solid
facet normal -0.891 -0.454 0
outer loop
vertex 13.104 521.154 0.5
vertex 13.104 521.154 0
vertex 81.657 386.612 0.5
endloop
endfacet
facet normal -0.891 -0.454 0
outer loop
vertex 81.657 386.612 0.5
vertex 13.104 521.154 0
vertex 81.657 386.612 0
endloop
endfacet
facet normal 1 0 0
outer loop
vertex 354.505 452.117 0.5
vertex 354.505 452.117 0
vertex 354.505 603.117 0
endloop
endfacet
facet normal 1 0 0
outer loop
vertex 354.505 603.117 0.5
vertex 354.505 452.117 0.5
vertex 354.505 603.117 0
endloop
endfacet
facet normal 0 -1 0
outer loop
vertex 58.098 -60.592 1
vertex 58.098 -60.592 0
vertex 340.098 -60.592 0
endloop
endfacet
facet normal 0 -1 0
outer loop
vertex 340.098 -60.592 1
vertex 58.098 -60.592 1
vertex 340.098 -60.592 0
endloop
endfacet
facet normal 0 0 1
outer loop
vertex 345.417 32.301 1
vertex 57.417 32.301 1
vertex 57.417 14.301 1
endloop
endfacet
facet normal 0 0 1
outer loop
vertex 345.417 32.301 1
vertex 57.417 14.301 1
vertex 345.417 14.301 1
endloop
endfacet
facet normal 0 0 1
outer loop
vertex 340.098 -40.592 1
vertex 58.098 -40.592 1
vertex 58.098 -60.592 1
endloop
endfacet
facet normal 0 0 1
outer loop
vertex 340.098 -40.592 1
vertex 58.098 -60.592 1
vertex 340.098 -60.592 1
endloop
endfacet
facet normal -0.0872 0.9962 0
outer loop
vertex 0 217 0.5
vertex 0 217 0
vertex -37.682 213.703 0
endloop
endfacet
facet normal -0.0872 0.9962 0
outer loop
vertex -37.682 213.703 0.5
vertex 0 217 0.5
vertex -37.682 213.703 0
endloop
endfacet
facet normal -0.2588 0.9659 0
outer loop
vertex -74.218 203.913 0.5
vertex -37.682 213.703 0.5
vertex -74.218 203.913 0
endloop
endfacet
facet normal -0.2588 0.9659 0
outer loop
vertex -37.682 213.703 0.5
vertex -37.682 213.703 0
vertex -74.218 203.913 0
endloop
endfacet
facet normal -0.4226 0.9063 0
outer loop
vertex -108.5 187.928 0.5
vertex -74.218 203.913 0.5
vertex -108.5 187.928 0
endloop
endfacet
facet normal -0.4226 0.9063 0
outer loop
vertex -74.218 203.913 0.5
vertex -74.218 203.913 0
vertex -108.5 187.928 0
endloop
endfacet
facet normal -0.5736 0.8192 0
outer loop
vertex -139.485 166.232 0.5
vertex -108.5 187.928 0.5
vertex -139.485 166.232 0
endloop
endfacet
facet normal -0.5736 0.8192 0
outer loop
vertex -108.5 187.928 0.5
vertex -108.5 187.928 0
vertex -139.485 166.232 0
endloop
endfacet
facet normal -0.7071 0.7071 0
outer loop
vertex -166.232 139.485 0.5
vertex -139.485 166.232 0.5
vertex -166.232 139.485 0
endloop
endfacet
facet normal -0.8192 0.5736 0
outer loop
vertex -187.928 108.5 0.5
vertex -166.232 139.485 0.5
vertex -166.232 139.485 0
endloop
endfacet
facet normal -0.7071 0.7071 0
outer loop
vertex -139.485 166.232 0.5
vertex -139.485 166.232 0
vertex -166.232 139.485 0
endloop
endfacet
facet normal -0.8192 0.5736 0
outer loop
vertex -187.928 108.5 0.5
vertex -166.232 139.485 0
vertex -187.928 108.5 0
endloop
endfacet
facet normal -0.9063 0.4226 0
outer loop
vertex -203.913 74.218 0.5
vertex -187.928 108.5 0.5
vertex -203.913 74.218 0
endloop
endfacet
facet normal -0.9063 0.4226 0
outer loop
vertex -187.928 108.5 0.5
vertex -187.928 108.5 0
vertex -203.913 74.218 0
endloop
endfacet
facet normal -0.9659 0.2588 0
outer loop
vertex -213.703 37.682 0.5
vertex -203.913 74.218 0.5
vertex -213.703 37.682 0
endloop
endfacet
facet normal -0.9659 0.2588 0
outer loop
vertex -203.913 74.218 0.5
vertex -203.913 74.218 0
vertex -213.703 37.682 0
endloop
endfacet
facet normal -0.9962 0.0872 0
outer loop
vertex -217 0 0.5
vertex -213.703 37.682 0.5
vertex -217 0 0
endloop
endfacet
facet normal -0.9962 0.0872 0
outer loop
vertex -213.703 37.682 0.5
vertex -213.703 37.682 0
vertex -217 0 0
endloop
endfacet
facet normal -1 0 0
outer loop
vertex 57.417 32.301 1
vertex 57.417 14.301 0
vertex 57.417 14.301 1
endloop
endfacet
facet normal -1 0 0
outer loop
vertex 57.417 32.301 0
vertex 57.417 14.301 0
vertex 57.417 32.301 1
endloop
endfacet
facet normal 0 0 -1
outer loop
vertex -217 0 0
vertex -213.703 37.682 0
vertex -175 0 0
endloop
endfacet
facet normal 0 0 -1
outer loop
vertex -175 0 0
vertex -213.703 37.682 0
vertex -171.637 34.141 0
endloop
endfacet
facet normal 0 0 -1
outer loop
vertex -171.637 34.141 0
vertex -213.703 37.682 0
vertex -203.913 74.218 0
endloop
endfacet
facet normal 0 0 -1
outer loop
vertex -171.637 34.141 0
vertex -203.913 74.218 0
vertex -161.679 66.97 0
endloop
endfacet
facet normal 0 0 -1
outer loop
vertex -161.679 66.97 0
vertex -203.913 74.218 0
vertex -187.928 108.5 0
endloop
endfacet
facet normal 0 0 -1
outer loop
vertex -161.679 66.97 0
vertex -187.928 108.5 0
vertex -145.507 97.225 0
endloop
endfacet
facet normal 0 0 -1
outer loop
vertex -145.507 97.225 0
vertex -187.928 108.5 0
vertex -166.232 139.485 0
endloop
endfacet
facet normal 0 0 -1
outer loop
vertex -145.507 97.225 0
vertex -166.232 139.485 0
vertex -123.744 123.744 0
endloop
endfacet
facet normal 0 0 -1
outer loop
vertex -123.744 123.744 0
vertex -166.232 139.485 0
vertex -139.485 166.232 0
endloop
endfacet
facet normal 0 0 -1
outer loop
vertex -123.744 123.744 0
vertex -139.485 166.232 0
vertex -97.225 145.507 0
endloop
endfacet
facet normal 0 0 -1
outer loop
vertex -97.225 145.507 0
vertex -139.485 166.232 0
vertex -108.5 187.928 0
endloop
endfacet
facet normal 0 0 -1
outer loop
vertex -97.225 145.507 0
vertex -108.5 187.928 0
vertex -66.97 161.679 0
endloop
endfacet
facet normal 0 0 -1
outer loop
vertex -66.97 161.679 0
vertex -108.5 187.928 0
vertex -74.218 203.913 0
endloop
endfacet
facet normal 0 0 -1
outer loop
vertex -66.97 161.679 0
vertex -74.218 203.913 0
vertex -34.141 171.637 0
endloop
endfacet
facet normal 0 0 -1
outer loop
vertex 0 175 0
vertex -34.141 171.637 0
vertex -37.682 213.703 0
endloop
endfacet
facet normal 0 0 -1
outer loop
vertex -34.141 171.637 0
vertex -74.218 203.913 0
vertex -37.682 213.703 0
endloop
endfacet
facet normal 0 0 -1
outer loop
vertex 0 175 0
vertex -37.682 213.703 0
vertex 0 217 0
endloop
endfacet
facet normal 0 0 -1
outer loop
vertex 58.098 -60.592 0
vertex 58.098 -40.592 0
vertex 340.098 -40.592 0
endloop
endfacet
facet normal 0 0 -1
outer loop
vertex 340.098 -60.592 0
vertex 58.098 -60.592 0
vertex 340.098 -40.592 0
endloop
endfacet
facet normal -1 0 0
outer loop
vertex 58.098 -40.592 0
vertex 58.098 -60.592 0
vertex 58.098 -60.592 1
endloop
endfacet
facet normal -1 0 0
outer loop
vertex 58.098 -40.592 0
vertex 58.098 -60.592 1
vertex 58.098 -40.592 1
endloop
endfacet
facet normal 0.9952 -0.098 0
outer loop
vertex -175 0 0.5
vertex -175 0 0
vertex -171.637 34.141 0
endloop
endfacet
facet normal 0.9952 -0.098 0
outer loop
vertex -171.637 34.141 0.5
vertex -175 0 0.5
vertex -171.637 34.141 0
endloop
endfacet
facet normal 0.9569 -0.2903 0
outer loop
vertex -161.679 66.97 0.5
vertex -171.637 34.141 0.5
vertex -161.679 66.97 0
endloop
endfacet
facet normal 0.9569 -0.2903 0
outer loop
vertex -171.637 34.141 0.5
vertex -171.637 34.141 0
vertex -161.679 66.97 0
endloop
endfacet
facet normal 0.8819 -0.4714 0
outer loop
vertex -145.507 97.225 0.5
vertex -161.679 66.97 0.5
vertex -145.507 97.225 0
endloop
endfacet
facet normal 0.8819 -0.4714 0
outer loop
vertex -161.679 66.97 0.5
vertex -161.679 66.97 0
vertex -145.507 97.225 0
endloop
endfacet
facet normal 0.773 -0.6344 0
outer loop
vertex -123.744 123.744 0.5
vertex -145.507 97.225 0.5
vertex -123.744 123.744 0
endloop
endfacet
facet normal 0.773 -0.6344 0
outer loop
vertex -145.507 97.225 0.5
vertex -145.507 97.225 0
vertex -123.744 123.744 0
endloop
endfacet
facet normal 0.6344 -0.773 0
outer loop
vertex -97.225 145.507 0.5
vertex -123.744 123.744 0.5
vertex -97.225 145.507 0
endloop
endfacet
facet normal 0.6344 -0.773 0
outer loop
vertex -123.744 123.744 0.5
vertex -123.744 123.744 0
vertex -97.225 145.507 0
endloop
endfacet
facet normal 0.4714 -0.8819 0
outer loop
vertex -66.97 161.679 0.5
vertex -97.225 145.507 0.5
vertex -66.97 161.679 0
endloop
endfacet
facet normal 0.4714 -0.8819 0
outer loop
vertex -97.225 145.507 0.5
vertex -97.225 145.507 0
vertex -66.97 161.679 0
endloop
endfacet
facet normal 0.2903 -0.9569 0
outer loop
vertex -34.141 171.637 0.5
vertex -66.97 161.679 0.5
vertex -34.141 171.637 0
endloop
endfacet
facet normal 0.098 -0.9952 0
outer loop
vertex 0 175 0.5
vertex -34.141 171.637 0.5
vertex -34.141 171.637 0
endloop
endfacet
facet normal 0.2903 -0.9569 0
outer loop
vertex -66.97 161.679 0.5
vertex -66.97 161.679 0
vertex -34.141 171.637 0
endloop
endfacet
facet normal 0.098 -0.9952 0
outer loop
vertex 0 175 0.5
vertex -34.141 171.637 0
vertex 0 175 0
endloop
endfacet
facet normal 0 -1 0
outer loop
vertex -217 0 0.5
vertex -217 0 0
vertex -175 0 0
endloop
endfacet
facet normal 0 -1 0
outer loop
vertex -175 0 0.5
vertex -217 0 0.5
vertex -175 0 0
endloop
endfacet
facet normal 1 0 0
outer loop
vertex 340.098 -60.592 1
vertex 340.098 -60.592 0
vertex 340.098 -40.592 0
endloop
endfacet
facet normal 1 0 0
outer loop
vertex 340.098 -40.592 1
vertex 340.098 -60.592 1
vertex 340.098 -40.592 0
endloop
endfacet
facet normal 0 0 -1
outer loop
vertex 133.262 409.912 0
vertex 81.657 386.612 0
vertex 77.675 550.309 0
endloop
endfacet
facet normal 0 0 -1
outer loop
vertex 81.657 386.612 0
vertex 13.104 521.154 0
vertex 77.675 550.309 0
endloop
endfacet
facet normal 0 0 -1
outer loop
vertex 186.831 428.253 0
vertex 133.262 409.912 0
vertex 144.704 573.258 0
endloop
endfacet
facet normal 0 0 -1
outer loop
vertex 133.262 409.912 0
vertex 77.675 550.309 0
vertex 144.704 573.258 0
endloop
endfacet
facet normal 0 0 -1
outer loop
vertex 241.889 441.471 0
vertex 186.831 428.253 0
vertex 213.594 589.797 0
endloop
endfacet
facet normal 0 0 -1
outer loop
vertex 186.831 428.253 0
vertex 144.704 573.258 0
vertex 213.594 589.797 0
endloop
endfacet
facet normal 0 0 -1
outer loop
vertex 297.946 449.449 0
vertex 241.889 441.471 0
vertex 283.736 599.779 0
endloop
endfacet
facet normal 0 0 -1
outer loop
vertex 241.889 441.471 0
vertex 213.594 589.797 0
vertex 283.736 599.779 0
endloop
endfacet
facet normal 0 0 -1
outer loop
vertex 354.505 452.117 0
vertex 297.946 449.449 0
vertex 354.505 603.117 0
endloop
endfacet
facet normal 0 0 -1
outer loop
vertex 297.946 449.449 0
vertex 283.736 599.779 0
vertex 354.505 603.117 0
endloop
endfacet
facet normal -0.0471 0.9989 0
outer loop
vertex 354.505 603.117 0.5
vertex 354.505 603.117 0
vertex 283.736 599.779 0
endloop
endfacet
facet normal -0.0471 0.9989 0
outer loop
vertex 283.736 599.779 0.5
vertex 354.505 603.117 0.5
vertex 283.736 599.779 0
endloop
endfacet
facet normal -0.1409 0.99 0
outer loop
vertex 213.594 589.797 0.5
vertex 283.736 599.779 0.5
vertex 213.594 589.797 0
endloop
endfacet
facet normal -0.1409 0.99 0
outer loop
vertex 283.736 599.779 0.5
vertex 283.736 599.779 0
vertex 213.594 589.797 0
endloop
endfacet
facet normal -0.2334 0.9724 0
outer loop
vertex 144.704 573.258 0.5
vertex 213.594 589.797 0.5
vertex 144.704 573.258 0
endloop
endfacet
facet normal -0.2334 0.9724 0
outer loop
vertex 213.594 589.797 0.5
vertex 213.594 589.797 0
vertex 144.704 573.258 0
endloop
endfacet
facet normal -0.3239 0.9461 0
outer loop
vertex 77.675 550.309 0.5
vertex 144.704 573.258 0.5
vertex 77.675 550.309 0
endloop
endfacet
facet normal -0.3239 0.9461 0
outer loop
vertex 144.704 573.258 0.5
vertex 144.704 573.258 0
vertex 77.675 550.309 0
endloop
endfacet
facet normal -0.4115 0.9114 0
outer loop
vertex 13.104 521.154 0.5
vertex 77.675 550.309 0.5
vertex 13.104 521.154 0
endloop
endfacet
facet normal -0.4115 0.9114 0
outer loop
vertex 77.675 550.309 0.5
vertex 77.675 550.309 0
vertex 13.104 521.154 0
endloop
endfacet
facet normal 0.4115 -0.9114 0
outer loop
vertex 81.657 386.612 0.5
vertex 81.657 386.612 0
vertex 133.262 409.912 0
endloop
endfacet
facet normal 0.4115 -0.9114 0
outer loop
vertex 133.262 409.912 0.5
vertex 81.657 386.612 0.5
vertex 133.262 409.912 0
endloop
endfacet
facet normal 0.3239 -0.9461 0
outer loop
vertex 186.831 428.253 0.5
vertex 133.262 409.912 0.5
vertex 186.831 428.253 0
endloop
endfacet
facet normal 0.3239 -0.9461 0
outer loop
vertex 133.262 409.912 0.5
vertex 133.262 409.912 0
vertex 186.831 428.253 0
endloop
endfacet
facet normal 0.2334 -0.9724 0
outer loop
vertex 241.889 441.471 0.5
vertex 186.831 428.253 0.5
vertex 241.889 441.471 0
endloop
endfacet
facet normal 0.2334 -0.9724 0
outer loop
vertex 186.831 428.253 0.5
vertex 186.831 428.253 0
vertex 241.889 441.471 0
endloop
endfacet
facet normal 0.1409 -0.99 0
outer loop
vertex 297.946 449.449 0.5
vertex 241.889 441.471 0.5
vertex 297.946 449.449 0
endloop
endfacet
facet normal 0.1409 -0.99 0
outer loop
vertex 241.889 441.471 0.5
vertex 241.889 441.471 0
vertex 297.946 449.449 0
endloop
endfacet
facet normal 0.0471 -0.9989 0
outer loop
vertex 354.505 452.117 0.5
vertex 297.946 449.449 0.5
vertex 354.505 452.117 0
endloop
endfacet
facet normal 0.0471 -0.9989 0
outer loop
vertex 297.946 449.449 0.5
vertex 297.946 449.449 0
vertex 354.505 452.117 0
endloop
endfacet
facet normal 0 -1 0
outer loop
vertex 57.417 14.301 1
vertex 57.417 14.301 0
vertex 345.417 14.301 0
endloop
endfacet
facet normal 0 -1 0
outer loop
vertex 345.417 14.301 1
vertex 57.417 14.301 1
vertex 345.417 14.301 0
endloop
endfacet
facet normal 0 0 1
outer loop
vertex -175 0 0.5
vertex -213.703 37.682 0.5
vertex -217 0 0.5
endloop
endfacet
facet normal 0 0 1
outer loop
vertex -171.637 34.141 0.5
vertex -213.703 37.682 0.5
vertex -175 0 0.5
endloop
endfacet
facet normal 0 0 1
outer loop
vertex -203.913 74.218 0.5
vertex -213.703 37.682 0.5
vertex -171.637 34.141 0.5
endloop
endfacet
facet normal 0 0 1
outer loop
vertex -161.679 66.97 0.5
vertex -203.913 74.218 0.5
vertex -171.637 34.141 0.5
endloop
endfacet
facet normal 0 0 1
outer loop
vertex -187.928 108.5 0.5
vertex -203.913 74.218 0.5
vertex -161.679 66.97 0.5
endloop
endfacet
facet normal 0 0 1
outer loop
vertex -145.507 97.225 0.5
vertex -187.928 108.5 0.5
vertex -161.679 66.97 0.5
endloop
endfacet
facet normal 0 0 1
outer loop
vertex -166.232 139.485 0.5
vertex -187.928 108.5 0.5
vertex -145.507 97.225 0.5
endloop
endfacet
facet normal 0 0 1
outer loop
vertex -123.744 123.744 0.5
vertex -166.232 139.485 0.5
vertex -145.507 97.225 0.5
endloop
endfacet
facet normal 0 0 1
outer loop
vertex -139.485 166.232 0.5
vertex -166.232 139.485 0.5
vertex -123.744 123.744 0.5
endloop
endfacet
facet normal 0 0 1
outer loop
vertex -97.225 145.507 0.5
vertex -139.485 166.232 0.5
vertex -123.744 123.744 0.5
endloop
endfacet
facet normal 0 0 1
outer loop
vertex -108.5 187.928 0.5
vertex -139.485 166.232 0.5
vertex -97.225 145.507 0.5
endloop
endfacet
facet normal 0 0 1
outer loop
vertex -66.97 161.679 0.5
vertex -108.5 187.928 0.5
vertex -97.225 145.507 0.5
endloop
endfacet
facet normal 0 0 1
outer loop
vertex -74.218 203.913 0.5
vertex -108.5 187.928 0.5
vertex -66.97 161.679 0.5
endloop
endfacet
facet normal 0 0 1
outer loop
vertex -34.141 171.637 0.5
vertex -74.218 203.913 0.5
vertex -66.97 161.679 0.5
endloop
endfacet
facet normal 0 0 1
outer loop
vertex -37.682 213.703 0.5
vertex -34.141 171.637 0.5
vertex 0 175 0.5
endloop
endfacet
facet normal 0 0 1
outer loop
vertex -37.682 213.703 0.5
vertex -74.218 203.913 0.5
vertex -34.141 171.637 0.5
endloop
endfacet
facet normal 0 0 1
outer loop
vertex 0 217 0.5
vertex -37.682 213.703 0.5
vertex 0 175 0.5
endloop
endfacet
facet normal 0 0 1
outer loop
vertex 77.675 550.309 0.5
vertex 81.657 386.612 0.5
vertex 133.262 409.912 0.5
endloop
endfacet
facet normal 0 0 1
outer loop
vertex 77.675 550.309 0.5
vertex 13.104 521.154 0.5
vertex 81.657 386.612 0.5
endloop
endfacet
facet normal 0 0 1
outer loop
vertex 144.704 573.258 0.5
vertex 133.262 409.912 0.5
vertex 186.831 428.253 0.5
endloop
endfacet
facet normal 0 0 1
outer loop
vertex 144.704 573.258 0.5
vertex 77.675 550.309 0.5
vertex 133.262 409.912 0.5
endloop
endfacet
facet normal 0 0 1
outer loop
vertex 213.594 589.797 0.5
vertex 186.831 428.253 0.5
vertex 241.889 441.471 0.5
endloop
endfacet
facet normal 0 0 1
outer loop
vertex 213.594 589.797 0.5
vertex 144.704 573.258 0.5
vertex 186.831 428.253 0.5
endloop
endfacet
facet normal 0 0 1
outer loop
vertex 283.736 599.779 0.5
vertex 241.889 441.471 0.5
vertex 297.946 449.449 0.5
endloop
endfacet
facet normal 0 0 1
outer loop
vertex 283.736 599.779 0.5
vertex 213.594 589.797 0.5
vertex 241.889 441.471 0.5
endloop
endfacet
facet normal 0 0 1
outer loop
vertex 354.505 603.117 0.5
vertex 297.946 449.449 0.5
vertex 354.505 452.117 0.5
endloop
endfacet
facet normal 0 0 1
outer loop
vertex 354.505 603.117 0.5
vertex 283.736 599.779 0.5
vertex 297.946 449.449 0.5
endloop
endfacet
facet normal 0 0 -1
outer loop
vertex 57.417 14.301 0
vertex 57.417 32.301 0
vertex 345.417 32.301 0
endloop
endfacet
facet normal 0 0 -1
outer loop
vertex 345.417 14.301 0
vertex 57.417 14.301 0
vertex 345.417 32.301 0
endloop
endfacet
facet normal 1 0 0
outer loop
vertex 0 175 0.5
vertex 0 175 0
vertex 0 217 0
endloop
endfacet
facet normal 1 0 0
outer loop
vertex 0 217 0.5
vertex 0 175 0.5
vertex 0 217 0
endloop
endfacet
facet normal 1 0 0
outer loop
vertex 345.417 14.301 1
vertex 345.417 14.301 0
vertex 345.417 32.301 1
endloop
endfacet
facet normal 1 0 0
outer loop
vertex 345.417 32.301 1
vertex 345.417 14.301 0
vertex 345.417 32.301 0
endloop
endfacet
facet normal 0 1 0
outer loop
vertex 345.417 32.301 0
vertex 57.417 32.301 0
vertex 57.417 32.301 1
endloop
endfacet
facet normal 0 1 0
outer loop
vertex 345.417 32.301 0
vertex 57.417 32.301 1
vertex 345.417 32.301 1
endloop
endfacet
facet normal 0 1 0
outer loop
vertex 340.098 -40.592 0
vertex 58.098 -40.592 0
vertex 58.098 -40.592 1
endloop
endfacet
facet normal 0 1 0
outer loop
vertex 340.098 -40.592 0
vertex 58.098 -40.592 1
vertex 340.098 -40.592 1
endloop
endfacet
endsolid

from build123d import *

# Parameters (mm, degrees)
F2_DEPTH = 0.5
F3_W     = 288
F3_H     = 18
F3_W_2   = 282
F3_H_2   = 20
F4_DEPTH = 1
F5_DEPTH = 0.5


with BuildPart() as f2:
    # F0 (on Top) → F2 (new body)
    with BuildSketch(Plane.XY):
        with BuildLine():
            ThreePointArc((-175, 0), (-123.743687, 123.743687), (0, 175))
            Line((0, 175), (0, 217))
            ThreePointArc((0, 217), (-153.442172, 153.442172), (-217, 0))
            Line((-217, 0), (-175, 0))
        make_face()
    extrude(amount=F2_DEPTH)


with BuildPart() as f4:
    # F3 (on Top) → F4 (new body)
    with BuildSketch(Plane.XY):
        with Locations((201.417454, 23.301498)):
            Rectangle(F3_W, F3_H)
        with Locations((199.098303, -50.59212)):
            Rectangle(F3_W_2, F3_H_2)
    extrude(amount=F4_DEPTH)


with BuildPart() as f5:
    # F1 (on Top) → F5 (new body)
    with BuildSketch(Plane.XY):
        with BuildLine():
            ThreePointArc((81.656802, 386.611653), (214.204428, 435.511054), (354.505092, 452.116732))
            Line((354.505092, 452.116732), (354.505092, 603.116732))
            ThreePointArc((354.505092, 603.116732), (178.954178, 582.338912), (13.104236, 521.153638))
            Line((13.104236, 521.153638), (81.656802, 386.611653))
        make_face()
    extrude(amount=F5_DEPTH)


solid = Compound([f2.part, f4.part, f5.part])
